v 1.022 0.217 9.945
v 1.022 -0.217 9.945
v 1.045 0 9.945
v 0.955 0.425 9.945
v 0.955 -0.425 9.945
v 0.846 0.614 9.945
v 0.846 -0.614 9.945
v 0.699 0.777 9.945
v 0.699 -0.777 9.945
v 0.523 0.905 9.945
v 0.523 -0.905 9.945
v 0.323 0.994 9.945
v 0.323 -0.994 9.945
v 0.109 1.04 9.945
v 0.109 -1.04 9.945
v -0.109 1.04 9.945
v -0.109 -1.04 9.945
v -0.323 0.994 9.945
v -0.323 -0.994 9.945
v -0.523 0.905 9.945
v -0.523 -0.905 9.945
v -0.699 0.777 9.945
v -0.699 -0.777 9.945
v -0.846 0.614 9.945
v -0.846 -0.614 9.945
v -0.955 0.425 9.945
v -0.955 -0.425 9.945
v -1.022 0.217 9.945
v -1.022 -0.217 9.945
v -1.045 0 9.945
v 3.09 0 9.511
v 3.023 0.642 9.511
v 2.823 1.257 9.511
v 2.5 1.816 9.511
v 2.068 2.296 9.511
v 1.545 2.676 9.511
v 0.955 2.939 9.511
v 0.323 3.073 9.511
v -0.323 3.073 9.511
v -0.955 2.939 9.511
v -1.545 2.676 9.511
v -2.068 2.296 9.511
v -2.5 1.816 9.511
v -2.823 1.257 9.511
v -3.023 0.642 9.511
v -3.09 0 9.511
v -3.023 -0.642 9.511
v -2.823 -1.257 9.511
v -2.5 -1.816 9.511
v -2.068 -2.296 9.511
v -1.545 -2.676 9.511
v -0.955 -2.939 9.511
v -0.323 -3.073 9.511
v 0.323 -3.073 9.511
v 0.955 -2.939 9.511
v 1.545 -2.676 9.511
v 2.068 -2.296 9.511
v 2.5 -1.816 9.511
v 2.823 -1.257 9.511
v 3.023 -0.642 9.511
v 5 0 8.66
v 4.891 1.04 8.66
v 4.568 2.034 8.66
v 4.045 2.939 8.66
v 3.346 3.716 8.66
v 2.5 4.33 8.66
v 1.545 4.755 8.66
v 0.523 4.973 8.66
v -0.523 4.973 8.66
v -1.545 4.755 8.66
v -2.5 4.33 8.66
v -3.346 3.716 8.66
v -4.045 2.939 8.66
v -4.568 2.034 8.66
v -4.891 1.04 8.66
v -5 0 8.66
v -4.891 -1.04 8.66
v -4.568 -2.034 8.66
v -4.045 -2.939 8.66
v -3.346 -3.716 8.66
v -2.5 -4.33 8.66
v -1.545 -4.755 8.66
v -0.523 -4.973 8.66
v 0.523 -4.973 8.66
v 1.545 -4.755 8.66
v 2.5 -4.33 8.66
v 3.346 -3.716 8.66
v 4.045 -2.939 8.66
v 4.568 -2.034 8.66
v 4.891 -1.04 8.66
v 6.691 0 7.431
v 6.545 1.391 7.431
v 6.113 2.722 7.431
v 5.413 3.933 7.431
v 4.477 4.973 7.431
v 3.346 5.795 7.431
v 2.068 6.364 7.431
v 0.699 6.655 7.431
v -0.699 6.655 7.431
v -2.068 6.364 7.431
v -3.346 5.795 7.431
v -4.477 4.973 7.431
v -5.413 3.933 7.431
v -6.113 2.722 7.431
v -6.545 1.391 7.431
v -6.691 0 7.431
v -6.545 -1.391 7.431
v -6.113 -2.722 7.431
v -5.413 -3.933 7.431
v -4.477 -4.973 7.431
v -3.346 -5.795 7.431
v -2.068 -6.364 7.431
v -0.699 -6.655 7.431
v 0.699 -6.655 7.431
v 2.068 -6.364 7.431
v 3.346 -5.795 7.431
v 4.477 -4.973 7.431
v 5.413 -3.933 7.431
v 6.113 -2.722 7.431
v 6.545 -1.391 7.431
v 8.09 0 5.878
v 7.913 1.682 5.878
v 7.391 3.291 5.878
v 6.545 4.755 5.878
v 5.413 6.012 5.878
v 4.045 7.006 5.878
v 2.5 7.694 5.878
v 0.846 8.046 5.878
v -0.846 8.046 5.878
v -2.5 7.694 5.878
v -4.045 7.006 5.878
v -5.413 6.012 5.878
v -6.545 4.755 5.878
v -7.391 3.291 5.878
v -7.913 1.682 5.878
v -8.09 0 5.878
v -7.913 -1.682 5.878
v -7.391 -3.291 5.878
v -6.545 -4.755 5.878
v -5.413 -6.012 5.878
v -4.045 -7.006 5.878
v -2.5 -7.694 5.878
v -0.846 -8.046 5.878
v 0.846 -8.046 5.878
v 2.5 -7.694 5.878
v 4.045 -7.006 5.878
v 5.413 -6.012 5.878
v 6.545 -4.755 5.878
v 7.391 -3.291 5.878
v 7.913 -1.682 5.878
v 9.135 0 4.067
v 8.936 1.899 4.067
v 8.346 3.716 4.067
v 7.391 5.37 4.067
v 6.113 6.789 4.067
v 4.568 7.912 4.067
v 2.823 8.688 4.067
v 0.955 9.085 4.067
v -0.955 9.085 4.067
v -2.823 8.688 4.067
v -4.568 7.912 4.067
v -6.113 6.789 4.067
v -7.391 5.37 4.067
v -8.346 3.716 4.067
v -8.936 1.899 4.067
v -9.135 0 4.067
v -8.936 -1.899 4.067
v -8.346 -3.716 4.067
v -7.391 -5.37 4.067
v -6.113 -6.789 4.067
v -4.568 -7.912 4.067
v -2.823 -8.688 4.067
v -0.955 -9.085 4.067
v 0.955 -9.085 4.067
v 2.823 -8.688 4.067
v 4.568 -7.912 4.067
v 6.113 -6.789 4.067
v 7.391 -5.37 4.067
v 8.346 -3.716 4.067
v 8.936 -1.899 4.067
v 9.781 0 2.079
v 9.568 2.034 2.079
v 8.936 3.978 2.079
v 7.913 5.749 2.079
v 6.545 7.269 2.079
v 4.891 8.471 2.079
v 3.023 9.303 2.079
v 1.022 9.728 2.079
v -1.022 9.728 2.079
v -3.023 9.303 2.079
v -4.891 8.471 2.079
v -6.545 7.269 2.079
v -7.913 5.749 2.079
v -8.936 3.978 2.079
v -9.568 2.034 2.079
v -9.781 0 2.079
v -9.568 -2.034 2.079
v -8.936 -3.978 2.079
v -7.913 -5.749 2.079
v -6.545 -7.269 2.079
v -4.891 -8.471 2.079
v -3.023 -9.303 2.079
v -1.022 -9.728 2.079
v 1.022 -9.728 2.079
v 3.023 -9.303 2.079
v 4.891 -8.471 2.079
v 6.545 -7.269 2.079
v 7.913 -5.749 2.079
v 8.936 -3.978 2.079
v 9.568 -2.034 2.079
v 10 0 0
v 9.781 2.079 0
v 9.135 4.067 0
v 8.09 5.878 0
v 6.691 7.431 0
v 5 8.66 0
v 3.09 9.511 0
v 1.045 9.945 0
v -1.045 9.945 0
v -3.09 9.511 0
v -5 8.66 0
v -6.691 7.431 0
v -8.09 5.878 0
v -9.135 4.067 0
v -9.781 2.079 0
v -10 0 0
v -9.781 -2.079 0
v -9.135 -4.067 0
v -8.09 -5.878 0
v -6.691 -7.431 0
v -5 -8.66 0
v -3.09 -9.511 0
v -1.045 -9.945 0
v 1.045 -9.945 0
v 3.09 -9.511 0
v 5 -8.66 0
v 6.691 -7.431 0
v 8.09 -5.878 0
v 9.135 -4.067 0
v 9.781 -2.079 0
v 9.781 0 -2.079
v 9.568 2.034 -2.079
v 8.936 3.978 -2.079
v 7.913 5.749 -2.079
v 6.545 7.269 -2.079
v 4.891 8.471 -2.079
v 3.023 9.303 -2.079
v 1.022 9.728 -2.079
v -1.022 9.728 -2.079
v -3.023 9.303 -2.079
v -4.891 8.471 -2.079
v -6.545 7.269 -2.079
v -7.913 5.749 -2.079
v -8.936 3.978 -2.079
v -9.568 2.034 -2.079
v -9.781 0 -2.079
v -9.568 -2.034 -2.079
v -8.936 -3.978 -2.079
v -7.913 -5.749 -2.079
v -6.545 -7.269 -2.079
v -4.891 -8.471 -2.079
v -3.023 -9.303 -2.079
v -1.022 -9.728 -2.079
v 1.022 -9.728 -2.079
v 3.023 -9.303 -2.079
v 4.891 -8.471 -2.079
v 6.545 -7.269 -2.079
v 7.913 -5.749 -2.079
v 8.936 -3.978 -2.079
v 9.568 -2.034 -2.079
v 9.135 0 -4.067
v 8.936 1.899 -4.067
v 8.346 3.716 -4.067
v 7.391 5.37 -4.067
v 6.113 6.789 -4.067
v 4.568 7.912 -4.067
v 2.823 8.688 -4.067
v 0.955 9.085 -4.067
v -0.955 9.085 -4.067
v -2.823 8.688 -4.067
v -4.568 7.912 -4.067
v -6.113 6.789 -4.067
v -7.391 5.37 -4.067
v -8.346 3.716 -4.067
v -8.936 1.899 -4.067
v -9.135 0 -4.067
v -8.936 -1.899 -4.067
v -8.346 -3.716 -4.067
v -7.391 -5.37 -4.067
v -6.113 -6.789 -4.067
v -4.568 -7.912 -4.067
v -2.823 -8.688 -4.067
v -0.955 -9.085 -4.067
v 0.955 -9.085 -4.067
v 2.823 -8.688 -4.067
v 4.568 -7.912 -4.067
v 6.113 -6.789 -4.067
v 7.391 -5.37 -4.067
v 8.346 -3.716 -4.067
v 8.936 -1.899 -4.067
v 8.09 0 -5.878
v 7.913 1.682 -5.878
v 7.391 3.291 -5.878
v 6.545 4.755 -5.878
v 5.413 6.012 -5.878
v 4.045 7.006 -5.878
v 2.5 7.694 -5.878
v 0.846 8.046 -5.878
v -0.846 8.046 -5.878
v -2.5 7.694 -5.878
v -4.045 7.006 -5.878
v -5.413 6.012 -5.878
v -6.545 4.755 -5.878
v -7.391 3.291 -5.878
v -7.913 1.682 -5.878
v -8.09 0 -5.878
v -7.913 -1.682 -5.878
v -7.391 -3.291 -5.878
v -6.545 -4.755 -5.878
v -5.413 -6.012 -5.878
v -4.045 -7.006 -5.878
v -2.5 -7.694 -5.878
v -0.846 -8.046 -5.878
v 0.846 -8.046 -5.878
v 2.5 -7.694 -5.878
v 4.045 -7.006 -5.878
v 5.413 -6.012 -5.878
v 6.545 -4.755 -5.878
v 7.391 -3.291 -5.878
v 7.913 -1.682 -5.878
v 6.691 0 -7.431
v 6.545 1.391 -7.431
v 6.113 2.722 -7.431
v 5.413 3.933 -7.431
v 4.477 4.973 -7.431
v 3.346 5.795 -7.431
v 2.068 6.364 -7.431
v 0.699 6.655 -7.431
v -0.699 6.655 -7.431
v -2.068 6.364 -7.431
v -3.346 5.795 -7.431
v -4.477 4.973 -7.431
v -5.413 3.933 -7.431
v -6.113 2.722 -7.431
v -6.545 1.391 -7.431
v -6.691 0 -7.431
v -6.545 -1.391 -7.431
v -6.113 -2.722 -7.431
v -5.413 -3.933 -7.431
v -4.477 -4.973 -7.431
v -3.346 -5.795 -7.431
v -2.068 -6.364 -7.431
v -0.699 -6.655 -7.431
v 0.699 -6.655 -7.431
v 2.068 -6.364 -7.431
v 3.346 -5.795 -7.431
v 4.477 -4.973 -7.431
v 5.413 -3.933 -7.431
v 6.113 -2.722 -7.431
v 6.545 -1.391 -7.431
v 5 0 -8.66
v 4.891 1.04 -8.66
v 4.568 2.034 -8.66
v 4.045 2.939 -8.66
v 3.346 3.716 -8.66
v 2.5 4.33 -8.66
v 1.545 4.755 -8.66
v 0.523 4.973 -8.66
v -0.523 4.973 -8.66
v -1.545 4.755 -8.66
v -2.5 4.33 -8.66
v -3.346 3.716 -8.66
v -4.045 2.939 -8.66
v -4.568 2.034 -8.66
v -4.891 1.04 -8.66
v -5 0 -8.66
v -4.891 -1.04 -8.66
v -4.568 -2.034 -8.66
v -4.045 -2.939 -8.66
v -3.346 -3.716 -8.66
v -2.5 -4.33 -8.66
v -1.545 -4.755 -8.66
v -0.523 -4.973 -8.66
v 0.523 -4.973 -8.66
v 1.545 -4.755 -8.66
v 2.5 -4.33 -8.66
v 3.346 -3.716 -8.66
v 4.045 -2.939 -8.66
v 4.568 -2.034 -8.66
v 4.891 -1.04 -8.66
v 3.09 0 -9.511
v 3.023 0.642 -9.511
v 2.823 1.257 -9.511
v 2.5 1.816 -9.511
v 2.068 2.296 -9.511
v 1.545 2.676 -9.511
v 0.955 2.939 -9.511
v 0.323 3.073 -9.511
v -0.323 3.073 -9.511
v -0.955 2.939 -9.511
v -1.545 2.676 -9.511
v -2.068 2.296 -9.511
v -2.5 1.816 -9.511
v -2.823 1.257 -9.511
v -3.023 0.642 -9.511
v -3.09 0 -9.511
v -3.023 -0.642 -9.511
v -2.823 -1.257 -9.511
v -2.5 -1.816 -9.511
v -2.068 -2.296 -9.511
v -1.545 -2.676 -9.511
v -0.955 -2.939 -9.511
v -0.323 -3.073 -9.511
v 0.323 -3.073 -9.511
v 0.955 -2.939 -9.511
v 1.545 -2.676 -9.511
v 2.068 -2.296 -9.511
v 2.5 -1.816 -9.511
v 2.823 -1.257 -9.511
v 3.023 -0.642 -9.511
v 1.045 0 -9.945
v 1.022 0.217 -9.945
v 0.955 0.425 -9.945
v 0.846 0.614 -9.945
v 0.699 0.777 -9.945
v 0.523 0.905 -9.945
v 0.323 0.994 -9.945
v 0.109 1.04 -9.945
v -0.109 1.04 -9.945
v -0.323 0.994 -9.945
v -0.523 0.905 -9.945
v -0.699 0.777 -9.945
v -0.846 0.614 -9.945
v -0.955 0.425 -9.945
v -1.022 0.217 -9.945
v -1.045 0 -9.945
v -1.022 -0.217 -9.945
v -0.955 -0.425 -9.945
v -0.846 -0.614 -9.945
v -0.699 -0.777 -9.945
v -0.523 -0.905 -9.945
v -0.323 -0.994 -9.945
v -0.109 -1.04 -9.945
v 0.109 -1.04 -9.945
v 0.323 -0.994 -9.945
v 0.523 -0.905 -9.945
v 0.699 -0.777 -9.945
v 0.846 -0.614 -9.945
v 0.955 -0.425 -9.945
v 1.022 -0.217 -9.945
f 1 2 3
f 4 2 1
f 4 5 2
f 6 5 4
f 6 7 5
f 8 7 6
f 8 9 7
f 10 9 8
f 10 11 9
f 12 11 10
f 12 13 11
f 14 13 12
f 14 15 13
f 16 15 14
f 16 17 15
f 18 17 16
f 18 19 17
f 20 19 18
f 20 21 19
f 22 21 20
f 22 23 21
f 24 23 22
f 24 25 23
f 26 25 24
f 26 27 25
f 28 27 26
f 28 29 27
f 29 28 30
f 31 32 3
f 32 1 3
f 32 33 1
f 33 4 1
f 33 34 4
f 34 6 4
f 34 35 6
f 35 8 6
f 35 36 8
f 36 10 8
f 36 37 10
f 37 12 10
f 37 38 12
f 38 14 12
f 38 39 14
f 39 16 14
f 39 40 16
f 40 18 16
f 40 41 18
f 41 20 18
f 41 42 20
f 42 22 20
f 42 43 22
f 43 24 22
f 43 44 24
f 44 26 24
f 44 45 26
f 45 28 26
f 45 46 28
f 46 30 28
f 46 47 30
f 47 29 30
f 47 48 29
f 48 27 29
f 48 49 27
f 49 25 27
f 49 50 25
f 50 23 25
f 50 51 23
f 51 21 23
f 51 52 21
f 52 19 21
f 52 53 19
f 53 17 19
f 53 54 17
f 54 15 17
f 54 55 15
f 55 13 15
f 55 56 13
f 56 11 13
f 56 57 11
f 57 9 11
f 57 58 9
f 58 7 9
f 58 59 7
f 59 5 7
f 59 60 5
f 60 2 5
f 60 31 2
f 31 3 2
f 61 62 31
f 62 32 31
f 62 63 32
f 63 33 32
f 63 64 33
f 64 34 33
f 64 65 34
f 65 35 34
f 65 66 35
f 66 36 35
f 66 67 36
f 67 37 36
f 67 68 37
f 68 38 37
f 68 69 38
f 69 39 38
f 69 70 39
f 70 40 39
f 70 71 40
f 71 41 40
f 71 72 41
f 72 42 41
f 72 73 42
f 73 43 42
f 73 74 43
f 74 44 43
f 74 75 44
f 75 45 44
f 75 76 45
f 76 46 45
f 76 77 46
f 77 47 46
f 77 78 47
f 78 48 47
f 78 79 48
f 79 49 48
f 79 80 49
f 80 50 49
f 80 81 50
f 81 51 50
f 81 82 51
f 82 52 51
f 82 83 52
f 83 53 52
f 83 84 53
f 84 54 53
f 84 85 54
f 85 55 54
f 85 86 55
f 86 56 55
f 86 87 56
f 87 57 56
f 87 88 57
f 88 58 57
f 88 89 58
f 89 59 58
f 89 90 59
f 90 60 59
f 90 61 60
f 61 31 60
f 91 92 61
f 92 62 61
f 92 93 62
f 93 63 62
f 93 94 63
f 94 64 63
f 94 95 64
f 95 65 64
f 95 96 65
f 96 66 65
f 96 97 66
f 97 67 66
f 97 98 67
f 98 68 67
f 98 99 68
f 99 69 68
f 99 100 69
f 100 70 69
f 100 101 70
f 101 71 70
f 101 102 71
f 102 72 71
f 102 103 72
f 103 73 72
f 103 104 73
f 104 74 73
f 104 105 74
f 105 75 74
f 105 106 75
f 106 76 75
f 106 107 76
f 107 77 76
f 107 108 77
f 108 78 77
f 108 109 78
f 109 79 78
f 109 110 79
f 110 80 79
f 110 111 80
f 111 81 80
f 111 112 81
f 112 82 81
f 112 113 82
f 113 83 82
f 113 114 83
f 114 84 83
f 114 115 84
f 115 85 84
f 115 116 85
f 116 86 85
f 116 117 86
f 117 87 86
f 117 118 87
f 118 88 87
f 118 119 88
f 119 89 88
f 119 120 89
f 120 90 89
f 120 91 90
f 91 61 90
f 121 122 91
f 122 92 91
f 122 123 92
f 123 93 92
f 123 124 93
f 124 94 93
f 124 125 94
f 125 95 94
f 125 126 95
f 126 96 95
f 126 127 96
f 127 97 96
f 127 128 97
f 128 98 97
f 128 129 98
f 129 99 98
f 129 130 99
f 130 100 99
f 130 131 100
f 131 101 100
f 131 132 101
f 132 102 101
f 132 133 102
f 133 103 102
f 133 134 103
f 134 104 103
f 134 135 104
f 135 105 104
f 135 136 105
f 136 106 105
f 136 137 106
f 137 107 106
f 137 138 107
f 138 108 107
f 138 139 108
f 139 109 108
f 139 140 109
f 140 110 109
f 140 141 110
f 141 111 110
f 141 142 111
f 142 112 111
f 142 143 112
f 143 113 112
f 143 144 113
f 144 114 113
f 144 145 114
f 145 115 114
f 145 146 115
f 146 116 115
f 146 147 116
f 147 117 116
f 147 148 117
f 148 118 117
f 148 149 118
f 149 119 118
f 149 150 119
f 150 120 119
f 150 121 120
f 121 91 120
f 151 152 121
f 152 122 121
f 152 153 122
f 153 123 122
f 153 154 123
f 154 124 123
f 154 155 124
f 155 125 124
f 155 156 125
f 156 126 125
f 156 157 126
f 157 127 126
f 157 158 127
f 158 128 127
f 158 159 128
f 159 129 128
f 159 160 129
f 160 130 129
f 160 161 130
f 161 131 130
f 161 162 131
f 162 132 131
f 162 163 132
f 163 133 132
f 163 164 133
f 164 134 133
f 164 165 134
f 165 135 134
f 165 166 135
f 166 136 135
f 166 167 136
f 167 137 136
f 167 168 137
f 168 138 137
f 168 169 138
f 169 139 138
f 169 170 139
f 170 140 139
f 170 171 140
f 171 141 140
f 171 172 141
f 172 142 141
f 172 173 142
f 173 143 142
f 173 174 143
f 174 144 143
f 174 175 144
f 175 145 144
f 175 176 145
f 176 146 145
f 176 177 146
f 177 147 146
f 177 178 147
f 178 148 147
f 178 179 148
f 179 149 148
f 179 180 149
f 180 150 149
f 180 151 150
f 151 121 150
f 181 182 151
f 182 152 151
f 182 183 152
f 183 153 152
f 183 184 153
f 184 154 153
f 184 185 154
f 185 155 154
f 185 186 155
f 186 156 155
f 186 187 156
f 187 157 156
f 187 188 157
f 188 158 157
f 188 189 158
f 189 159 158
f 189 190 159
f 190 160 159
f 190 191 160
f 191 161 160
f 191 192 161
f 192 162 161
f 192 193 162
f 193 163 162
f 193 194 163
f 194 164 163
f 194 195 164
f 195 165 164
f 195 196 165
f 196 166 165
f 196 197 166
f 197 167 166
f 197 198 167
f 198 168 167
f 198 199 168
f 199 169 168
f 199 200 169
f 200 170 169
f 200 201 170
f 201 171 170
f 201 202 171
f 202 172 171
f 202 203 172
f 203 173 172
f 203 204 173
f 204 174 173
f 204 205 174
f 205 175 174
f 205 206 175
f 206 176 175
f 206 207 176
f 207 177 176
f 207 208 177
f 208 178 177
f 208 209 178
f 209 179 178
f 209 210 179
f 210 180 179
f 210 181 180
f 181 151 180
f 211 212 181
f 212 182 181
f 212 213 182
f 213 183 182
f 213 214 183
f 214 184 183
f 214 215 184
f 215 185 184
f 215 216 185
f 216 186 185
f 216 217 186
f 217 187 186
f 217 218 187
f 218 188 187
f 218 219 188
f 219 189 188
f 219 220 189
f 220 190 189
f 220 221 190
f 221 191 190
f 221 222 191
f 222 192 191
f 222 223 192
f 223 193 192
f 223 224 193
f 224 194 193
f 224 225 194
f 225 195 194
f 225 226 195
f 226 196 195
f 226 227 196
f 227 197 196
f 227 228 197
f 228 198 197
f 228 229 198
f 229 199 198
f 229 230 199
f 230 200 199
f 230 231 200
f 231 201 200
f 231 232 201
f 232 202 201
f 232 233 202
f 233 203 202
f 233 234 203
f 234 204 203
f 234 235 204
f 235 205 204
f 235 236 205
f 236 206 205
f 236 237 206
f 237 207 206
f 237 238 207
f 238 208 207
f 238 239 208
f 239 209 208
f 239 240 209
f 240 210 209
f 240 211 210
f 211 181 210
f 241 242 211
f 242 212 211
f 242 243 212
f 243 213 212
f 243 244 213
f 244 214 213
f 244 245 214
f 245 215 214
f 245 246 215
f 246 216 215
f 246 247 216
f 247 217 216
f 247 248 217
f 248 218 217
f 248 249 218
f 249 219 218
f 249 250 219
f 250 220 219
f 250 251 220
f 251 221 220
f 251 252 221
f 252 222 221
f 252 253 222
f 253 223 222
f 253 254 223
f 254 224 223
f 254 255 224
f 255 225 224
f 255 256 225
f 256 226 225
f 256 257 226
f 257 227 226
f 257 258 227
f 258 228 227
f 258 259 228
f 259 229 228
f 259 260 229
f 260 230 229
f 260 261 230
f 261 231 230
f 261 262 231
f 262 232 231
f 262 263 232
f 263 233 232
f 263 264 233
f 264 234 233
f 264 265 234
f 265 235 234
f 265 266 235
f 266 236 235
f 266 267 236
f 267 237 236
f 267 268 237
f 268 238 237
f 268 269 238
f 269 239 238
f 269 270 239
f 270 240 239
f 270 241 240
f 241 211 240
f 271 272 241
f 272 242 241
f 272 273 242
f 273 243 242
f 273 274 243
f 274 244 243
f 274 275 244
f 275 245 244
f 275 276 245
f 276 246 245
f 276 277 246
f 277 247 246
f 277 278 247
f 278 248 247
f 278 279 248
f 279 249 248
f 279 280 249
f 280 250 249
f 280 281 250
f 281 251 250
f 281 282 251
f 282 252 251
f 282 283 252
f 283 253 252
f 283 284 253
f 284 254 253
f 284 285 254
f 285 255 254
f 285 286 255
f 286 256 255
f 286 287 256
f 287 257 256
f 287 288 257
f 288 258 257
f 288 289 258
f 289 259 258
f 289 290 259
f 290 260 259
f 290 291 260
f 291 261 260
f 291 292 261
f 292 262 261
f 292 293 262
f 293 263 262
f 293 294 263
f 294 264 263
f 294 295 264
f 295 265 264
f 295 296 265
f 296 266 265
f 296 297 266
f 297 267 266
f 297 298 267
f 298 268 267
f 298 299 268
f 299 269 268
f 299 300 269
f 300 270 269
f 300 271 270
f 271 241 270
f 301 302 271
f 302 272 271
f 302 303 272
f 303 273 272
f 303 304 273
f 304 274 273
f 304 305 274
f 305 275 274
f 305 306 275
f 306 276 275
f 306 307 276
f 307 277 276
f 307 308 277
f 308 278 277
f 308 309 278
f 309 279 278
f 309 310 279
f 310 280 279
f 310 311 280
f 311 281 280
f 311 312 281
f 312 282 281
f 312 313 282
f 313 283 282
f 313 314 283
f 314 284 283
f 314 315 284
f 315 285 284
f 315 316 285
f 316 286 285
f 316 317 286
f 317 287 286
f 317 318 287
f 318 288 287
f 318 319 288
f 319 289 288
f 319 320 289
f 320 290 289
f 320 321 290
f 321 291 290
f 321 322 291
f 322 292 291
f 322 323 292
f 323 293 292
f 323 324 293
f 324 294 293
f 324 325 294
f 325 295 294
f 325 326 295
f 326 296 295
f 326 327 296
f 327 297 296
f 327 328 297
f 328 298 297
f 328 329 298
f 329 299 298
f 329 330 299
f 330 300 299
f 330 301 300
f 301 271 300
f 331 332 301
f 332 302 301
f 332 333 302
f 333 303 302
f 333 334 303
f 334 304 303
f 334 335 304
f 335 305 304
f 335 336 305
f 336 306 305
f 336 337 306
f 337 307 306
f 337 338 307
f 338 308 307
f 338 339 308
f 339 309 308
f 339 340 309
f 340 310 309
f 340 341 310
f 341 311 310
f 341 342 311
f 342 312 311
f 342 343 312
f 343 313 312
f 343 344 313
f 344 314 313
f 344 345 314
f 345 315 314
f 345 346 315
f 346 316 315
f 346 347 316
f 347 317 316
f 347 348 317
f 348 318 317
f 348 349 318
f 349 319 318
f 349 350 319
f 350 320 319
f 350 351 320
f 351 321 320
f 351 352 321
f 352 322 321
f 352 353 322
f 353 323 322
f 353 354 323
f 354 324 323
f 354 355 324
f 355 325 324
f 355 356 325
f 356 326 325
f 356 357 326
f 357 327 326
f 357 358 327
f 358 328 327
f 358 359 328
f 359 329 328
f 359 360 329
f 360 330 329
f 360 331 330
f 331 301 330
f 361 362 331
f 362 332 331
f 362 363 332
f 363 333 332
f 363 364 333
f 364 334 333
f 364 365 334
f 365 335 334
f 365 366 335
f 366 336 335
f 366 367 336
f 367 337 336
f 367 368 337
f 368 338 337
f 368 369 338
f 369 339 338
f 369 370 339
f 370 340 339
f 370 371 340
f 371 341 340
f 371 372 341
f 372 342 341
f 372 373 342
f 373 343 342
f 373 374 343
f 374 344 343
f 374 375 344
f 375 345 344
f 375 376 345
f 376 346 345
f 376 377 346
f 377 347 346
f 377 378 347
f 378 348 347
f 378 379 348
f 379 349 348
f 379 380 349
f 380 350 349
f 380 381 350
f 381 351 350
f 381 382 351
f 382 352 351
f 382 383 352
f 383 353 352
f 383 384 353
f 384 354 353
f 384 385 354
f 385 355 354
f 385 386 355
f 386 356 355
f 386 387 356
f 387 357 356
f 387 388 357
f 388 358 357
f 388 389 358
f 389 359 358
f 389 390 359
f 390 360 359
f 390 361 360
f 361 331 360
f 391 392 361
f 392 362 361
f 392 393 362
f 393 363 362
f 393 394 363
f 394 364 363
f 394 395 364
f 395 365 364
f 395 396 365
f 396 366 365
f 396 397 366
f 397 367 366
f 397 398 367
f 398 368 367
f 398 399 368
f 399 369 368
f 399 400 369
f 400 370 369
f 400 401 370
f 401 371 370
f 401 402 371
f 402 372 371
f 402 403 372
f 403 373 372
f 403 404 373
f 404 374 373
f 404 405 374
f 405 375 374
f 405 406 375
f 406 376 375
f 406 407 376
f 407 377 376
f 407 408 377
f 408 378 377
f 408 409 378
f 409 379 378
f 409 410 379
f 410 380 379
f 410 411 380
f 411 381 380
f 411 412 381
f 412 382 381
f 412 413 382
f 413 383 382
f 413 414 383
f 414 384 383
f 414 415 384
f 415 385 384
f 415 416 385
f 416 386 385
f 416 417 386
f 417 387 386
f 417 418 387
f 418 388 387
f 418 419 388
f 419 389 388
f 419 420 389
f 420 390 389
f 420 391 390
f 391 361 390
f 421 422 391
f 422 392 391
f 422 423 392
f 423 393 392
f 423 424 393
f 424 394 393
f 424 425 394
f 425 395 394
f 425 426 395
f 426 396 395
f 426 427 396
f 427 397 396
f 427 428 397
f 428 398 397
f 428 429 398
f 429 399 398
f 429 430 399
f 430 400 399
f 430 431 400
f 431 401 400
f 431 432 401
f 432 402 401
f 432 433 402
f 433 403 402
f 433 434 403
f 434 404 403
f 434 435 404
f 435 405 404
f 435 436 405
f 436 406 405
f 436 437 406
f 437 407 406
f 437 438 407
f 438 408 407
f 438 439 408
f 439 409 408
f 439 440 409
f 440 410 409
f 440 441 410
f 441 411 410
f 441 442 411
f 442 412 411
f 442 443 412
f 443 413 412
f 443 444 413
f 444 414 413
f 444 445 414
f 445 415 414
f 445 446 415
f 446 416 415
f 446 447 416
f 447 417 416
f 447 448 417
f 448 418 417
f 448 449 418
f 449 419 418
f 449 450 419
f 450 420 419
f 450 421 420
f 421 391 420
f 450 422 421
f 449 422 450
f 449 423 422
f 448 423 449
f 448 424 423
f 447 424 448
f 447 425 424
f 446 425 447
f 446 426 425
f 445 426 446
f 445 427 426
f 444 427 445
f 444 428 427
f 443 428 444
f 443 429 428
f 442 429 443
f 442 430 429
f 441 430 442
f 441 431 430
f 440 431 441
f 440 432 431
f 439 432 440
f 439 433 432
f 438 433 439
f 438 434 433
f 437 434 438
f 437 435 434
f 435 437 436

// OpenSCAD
// spheres are automatically centered. makes sense.
sphere(r=10);
